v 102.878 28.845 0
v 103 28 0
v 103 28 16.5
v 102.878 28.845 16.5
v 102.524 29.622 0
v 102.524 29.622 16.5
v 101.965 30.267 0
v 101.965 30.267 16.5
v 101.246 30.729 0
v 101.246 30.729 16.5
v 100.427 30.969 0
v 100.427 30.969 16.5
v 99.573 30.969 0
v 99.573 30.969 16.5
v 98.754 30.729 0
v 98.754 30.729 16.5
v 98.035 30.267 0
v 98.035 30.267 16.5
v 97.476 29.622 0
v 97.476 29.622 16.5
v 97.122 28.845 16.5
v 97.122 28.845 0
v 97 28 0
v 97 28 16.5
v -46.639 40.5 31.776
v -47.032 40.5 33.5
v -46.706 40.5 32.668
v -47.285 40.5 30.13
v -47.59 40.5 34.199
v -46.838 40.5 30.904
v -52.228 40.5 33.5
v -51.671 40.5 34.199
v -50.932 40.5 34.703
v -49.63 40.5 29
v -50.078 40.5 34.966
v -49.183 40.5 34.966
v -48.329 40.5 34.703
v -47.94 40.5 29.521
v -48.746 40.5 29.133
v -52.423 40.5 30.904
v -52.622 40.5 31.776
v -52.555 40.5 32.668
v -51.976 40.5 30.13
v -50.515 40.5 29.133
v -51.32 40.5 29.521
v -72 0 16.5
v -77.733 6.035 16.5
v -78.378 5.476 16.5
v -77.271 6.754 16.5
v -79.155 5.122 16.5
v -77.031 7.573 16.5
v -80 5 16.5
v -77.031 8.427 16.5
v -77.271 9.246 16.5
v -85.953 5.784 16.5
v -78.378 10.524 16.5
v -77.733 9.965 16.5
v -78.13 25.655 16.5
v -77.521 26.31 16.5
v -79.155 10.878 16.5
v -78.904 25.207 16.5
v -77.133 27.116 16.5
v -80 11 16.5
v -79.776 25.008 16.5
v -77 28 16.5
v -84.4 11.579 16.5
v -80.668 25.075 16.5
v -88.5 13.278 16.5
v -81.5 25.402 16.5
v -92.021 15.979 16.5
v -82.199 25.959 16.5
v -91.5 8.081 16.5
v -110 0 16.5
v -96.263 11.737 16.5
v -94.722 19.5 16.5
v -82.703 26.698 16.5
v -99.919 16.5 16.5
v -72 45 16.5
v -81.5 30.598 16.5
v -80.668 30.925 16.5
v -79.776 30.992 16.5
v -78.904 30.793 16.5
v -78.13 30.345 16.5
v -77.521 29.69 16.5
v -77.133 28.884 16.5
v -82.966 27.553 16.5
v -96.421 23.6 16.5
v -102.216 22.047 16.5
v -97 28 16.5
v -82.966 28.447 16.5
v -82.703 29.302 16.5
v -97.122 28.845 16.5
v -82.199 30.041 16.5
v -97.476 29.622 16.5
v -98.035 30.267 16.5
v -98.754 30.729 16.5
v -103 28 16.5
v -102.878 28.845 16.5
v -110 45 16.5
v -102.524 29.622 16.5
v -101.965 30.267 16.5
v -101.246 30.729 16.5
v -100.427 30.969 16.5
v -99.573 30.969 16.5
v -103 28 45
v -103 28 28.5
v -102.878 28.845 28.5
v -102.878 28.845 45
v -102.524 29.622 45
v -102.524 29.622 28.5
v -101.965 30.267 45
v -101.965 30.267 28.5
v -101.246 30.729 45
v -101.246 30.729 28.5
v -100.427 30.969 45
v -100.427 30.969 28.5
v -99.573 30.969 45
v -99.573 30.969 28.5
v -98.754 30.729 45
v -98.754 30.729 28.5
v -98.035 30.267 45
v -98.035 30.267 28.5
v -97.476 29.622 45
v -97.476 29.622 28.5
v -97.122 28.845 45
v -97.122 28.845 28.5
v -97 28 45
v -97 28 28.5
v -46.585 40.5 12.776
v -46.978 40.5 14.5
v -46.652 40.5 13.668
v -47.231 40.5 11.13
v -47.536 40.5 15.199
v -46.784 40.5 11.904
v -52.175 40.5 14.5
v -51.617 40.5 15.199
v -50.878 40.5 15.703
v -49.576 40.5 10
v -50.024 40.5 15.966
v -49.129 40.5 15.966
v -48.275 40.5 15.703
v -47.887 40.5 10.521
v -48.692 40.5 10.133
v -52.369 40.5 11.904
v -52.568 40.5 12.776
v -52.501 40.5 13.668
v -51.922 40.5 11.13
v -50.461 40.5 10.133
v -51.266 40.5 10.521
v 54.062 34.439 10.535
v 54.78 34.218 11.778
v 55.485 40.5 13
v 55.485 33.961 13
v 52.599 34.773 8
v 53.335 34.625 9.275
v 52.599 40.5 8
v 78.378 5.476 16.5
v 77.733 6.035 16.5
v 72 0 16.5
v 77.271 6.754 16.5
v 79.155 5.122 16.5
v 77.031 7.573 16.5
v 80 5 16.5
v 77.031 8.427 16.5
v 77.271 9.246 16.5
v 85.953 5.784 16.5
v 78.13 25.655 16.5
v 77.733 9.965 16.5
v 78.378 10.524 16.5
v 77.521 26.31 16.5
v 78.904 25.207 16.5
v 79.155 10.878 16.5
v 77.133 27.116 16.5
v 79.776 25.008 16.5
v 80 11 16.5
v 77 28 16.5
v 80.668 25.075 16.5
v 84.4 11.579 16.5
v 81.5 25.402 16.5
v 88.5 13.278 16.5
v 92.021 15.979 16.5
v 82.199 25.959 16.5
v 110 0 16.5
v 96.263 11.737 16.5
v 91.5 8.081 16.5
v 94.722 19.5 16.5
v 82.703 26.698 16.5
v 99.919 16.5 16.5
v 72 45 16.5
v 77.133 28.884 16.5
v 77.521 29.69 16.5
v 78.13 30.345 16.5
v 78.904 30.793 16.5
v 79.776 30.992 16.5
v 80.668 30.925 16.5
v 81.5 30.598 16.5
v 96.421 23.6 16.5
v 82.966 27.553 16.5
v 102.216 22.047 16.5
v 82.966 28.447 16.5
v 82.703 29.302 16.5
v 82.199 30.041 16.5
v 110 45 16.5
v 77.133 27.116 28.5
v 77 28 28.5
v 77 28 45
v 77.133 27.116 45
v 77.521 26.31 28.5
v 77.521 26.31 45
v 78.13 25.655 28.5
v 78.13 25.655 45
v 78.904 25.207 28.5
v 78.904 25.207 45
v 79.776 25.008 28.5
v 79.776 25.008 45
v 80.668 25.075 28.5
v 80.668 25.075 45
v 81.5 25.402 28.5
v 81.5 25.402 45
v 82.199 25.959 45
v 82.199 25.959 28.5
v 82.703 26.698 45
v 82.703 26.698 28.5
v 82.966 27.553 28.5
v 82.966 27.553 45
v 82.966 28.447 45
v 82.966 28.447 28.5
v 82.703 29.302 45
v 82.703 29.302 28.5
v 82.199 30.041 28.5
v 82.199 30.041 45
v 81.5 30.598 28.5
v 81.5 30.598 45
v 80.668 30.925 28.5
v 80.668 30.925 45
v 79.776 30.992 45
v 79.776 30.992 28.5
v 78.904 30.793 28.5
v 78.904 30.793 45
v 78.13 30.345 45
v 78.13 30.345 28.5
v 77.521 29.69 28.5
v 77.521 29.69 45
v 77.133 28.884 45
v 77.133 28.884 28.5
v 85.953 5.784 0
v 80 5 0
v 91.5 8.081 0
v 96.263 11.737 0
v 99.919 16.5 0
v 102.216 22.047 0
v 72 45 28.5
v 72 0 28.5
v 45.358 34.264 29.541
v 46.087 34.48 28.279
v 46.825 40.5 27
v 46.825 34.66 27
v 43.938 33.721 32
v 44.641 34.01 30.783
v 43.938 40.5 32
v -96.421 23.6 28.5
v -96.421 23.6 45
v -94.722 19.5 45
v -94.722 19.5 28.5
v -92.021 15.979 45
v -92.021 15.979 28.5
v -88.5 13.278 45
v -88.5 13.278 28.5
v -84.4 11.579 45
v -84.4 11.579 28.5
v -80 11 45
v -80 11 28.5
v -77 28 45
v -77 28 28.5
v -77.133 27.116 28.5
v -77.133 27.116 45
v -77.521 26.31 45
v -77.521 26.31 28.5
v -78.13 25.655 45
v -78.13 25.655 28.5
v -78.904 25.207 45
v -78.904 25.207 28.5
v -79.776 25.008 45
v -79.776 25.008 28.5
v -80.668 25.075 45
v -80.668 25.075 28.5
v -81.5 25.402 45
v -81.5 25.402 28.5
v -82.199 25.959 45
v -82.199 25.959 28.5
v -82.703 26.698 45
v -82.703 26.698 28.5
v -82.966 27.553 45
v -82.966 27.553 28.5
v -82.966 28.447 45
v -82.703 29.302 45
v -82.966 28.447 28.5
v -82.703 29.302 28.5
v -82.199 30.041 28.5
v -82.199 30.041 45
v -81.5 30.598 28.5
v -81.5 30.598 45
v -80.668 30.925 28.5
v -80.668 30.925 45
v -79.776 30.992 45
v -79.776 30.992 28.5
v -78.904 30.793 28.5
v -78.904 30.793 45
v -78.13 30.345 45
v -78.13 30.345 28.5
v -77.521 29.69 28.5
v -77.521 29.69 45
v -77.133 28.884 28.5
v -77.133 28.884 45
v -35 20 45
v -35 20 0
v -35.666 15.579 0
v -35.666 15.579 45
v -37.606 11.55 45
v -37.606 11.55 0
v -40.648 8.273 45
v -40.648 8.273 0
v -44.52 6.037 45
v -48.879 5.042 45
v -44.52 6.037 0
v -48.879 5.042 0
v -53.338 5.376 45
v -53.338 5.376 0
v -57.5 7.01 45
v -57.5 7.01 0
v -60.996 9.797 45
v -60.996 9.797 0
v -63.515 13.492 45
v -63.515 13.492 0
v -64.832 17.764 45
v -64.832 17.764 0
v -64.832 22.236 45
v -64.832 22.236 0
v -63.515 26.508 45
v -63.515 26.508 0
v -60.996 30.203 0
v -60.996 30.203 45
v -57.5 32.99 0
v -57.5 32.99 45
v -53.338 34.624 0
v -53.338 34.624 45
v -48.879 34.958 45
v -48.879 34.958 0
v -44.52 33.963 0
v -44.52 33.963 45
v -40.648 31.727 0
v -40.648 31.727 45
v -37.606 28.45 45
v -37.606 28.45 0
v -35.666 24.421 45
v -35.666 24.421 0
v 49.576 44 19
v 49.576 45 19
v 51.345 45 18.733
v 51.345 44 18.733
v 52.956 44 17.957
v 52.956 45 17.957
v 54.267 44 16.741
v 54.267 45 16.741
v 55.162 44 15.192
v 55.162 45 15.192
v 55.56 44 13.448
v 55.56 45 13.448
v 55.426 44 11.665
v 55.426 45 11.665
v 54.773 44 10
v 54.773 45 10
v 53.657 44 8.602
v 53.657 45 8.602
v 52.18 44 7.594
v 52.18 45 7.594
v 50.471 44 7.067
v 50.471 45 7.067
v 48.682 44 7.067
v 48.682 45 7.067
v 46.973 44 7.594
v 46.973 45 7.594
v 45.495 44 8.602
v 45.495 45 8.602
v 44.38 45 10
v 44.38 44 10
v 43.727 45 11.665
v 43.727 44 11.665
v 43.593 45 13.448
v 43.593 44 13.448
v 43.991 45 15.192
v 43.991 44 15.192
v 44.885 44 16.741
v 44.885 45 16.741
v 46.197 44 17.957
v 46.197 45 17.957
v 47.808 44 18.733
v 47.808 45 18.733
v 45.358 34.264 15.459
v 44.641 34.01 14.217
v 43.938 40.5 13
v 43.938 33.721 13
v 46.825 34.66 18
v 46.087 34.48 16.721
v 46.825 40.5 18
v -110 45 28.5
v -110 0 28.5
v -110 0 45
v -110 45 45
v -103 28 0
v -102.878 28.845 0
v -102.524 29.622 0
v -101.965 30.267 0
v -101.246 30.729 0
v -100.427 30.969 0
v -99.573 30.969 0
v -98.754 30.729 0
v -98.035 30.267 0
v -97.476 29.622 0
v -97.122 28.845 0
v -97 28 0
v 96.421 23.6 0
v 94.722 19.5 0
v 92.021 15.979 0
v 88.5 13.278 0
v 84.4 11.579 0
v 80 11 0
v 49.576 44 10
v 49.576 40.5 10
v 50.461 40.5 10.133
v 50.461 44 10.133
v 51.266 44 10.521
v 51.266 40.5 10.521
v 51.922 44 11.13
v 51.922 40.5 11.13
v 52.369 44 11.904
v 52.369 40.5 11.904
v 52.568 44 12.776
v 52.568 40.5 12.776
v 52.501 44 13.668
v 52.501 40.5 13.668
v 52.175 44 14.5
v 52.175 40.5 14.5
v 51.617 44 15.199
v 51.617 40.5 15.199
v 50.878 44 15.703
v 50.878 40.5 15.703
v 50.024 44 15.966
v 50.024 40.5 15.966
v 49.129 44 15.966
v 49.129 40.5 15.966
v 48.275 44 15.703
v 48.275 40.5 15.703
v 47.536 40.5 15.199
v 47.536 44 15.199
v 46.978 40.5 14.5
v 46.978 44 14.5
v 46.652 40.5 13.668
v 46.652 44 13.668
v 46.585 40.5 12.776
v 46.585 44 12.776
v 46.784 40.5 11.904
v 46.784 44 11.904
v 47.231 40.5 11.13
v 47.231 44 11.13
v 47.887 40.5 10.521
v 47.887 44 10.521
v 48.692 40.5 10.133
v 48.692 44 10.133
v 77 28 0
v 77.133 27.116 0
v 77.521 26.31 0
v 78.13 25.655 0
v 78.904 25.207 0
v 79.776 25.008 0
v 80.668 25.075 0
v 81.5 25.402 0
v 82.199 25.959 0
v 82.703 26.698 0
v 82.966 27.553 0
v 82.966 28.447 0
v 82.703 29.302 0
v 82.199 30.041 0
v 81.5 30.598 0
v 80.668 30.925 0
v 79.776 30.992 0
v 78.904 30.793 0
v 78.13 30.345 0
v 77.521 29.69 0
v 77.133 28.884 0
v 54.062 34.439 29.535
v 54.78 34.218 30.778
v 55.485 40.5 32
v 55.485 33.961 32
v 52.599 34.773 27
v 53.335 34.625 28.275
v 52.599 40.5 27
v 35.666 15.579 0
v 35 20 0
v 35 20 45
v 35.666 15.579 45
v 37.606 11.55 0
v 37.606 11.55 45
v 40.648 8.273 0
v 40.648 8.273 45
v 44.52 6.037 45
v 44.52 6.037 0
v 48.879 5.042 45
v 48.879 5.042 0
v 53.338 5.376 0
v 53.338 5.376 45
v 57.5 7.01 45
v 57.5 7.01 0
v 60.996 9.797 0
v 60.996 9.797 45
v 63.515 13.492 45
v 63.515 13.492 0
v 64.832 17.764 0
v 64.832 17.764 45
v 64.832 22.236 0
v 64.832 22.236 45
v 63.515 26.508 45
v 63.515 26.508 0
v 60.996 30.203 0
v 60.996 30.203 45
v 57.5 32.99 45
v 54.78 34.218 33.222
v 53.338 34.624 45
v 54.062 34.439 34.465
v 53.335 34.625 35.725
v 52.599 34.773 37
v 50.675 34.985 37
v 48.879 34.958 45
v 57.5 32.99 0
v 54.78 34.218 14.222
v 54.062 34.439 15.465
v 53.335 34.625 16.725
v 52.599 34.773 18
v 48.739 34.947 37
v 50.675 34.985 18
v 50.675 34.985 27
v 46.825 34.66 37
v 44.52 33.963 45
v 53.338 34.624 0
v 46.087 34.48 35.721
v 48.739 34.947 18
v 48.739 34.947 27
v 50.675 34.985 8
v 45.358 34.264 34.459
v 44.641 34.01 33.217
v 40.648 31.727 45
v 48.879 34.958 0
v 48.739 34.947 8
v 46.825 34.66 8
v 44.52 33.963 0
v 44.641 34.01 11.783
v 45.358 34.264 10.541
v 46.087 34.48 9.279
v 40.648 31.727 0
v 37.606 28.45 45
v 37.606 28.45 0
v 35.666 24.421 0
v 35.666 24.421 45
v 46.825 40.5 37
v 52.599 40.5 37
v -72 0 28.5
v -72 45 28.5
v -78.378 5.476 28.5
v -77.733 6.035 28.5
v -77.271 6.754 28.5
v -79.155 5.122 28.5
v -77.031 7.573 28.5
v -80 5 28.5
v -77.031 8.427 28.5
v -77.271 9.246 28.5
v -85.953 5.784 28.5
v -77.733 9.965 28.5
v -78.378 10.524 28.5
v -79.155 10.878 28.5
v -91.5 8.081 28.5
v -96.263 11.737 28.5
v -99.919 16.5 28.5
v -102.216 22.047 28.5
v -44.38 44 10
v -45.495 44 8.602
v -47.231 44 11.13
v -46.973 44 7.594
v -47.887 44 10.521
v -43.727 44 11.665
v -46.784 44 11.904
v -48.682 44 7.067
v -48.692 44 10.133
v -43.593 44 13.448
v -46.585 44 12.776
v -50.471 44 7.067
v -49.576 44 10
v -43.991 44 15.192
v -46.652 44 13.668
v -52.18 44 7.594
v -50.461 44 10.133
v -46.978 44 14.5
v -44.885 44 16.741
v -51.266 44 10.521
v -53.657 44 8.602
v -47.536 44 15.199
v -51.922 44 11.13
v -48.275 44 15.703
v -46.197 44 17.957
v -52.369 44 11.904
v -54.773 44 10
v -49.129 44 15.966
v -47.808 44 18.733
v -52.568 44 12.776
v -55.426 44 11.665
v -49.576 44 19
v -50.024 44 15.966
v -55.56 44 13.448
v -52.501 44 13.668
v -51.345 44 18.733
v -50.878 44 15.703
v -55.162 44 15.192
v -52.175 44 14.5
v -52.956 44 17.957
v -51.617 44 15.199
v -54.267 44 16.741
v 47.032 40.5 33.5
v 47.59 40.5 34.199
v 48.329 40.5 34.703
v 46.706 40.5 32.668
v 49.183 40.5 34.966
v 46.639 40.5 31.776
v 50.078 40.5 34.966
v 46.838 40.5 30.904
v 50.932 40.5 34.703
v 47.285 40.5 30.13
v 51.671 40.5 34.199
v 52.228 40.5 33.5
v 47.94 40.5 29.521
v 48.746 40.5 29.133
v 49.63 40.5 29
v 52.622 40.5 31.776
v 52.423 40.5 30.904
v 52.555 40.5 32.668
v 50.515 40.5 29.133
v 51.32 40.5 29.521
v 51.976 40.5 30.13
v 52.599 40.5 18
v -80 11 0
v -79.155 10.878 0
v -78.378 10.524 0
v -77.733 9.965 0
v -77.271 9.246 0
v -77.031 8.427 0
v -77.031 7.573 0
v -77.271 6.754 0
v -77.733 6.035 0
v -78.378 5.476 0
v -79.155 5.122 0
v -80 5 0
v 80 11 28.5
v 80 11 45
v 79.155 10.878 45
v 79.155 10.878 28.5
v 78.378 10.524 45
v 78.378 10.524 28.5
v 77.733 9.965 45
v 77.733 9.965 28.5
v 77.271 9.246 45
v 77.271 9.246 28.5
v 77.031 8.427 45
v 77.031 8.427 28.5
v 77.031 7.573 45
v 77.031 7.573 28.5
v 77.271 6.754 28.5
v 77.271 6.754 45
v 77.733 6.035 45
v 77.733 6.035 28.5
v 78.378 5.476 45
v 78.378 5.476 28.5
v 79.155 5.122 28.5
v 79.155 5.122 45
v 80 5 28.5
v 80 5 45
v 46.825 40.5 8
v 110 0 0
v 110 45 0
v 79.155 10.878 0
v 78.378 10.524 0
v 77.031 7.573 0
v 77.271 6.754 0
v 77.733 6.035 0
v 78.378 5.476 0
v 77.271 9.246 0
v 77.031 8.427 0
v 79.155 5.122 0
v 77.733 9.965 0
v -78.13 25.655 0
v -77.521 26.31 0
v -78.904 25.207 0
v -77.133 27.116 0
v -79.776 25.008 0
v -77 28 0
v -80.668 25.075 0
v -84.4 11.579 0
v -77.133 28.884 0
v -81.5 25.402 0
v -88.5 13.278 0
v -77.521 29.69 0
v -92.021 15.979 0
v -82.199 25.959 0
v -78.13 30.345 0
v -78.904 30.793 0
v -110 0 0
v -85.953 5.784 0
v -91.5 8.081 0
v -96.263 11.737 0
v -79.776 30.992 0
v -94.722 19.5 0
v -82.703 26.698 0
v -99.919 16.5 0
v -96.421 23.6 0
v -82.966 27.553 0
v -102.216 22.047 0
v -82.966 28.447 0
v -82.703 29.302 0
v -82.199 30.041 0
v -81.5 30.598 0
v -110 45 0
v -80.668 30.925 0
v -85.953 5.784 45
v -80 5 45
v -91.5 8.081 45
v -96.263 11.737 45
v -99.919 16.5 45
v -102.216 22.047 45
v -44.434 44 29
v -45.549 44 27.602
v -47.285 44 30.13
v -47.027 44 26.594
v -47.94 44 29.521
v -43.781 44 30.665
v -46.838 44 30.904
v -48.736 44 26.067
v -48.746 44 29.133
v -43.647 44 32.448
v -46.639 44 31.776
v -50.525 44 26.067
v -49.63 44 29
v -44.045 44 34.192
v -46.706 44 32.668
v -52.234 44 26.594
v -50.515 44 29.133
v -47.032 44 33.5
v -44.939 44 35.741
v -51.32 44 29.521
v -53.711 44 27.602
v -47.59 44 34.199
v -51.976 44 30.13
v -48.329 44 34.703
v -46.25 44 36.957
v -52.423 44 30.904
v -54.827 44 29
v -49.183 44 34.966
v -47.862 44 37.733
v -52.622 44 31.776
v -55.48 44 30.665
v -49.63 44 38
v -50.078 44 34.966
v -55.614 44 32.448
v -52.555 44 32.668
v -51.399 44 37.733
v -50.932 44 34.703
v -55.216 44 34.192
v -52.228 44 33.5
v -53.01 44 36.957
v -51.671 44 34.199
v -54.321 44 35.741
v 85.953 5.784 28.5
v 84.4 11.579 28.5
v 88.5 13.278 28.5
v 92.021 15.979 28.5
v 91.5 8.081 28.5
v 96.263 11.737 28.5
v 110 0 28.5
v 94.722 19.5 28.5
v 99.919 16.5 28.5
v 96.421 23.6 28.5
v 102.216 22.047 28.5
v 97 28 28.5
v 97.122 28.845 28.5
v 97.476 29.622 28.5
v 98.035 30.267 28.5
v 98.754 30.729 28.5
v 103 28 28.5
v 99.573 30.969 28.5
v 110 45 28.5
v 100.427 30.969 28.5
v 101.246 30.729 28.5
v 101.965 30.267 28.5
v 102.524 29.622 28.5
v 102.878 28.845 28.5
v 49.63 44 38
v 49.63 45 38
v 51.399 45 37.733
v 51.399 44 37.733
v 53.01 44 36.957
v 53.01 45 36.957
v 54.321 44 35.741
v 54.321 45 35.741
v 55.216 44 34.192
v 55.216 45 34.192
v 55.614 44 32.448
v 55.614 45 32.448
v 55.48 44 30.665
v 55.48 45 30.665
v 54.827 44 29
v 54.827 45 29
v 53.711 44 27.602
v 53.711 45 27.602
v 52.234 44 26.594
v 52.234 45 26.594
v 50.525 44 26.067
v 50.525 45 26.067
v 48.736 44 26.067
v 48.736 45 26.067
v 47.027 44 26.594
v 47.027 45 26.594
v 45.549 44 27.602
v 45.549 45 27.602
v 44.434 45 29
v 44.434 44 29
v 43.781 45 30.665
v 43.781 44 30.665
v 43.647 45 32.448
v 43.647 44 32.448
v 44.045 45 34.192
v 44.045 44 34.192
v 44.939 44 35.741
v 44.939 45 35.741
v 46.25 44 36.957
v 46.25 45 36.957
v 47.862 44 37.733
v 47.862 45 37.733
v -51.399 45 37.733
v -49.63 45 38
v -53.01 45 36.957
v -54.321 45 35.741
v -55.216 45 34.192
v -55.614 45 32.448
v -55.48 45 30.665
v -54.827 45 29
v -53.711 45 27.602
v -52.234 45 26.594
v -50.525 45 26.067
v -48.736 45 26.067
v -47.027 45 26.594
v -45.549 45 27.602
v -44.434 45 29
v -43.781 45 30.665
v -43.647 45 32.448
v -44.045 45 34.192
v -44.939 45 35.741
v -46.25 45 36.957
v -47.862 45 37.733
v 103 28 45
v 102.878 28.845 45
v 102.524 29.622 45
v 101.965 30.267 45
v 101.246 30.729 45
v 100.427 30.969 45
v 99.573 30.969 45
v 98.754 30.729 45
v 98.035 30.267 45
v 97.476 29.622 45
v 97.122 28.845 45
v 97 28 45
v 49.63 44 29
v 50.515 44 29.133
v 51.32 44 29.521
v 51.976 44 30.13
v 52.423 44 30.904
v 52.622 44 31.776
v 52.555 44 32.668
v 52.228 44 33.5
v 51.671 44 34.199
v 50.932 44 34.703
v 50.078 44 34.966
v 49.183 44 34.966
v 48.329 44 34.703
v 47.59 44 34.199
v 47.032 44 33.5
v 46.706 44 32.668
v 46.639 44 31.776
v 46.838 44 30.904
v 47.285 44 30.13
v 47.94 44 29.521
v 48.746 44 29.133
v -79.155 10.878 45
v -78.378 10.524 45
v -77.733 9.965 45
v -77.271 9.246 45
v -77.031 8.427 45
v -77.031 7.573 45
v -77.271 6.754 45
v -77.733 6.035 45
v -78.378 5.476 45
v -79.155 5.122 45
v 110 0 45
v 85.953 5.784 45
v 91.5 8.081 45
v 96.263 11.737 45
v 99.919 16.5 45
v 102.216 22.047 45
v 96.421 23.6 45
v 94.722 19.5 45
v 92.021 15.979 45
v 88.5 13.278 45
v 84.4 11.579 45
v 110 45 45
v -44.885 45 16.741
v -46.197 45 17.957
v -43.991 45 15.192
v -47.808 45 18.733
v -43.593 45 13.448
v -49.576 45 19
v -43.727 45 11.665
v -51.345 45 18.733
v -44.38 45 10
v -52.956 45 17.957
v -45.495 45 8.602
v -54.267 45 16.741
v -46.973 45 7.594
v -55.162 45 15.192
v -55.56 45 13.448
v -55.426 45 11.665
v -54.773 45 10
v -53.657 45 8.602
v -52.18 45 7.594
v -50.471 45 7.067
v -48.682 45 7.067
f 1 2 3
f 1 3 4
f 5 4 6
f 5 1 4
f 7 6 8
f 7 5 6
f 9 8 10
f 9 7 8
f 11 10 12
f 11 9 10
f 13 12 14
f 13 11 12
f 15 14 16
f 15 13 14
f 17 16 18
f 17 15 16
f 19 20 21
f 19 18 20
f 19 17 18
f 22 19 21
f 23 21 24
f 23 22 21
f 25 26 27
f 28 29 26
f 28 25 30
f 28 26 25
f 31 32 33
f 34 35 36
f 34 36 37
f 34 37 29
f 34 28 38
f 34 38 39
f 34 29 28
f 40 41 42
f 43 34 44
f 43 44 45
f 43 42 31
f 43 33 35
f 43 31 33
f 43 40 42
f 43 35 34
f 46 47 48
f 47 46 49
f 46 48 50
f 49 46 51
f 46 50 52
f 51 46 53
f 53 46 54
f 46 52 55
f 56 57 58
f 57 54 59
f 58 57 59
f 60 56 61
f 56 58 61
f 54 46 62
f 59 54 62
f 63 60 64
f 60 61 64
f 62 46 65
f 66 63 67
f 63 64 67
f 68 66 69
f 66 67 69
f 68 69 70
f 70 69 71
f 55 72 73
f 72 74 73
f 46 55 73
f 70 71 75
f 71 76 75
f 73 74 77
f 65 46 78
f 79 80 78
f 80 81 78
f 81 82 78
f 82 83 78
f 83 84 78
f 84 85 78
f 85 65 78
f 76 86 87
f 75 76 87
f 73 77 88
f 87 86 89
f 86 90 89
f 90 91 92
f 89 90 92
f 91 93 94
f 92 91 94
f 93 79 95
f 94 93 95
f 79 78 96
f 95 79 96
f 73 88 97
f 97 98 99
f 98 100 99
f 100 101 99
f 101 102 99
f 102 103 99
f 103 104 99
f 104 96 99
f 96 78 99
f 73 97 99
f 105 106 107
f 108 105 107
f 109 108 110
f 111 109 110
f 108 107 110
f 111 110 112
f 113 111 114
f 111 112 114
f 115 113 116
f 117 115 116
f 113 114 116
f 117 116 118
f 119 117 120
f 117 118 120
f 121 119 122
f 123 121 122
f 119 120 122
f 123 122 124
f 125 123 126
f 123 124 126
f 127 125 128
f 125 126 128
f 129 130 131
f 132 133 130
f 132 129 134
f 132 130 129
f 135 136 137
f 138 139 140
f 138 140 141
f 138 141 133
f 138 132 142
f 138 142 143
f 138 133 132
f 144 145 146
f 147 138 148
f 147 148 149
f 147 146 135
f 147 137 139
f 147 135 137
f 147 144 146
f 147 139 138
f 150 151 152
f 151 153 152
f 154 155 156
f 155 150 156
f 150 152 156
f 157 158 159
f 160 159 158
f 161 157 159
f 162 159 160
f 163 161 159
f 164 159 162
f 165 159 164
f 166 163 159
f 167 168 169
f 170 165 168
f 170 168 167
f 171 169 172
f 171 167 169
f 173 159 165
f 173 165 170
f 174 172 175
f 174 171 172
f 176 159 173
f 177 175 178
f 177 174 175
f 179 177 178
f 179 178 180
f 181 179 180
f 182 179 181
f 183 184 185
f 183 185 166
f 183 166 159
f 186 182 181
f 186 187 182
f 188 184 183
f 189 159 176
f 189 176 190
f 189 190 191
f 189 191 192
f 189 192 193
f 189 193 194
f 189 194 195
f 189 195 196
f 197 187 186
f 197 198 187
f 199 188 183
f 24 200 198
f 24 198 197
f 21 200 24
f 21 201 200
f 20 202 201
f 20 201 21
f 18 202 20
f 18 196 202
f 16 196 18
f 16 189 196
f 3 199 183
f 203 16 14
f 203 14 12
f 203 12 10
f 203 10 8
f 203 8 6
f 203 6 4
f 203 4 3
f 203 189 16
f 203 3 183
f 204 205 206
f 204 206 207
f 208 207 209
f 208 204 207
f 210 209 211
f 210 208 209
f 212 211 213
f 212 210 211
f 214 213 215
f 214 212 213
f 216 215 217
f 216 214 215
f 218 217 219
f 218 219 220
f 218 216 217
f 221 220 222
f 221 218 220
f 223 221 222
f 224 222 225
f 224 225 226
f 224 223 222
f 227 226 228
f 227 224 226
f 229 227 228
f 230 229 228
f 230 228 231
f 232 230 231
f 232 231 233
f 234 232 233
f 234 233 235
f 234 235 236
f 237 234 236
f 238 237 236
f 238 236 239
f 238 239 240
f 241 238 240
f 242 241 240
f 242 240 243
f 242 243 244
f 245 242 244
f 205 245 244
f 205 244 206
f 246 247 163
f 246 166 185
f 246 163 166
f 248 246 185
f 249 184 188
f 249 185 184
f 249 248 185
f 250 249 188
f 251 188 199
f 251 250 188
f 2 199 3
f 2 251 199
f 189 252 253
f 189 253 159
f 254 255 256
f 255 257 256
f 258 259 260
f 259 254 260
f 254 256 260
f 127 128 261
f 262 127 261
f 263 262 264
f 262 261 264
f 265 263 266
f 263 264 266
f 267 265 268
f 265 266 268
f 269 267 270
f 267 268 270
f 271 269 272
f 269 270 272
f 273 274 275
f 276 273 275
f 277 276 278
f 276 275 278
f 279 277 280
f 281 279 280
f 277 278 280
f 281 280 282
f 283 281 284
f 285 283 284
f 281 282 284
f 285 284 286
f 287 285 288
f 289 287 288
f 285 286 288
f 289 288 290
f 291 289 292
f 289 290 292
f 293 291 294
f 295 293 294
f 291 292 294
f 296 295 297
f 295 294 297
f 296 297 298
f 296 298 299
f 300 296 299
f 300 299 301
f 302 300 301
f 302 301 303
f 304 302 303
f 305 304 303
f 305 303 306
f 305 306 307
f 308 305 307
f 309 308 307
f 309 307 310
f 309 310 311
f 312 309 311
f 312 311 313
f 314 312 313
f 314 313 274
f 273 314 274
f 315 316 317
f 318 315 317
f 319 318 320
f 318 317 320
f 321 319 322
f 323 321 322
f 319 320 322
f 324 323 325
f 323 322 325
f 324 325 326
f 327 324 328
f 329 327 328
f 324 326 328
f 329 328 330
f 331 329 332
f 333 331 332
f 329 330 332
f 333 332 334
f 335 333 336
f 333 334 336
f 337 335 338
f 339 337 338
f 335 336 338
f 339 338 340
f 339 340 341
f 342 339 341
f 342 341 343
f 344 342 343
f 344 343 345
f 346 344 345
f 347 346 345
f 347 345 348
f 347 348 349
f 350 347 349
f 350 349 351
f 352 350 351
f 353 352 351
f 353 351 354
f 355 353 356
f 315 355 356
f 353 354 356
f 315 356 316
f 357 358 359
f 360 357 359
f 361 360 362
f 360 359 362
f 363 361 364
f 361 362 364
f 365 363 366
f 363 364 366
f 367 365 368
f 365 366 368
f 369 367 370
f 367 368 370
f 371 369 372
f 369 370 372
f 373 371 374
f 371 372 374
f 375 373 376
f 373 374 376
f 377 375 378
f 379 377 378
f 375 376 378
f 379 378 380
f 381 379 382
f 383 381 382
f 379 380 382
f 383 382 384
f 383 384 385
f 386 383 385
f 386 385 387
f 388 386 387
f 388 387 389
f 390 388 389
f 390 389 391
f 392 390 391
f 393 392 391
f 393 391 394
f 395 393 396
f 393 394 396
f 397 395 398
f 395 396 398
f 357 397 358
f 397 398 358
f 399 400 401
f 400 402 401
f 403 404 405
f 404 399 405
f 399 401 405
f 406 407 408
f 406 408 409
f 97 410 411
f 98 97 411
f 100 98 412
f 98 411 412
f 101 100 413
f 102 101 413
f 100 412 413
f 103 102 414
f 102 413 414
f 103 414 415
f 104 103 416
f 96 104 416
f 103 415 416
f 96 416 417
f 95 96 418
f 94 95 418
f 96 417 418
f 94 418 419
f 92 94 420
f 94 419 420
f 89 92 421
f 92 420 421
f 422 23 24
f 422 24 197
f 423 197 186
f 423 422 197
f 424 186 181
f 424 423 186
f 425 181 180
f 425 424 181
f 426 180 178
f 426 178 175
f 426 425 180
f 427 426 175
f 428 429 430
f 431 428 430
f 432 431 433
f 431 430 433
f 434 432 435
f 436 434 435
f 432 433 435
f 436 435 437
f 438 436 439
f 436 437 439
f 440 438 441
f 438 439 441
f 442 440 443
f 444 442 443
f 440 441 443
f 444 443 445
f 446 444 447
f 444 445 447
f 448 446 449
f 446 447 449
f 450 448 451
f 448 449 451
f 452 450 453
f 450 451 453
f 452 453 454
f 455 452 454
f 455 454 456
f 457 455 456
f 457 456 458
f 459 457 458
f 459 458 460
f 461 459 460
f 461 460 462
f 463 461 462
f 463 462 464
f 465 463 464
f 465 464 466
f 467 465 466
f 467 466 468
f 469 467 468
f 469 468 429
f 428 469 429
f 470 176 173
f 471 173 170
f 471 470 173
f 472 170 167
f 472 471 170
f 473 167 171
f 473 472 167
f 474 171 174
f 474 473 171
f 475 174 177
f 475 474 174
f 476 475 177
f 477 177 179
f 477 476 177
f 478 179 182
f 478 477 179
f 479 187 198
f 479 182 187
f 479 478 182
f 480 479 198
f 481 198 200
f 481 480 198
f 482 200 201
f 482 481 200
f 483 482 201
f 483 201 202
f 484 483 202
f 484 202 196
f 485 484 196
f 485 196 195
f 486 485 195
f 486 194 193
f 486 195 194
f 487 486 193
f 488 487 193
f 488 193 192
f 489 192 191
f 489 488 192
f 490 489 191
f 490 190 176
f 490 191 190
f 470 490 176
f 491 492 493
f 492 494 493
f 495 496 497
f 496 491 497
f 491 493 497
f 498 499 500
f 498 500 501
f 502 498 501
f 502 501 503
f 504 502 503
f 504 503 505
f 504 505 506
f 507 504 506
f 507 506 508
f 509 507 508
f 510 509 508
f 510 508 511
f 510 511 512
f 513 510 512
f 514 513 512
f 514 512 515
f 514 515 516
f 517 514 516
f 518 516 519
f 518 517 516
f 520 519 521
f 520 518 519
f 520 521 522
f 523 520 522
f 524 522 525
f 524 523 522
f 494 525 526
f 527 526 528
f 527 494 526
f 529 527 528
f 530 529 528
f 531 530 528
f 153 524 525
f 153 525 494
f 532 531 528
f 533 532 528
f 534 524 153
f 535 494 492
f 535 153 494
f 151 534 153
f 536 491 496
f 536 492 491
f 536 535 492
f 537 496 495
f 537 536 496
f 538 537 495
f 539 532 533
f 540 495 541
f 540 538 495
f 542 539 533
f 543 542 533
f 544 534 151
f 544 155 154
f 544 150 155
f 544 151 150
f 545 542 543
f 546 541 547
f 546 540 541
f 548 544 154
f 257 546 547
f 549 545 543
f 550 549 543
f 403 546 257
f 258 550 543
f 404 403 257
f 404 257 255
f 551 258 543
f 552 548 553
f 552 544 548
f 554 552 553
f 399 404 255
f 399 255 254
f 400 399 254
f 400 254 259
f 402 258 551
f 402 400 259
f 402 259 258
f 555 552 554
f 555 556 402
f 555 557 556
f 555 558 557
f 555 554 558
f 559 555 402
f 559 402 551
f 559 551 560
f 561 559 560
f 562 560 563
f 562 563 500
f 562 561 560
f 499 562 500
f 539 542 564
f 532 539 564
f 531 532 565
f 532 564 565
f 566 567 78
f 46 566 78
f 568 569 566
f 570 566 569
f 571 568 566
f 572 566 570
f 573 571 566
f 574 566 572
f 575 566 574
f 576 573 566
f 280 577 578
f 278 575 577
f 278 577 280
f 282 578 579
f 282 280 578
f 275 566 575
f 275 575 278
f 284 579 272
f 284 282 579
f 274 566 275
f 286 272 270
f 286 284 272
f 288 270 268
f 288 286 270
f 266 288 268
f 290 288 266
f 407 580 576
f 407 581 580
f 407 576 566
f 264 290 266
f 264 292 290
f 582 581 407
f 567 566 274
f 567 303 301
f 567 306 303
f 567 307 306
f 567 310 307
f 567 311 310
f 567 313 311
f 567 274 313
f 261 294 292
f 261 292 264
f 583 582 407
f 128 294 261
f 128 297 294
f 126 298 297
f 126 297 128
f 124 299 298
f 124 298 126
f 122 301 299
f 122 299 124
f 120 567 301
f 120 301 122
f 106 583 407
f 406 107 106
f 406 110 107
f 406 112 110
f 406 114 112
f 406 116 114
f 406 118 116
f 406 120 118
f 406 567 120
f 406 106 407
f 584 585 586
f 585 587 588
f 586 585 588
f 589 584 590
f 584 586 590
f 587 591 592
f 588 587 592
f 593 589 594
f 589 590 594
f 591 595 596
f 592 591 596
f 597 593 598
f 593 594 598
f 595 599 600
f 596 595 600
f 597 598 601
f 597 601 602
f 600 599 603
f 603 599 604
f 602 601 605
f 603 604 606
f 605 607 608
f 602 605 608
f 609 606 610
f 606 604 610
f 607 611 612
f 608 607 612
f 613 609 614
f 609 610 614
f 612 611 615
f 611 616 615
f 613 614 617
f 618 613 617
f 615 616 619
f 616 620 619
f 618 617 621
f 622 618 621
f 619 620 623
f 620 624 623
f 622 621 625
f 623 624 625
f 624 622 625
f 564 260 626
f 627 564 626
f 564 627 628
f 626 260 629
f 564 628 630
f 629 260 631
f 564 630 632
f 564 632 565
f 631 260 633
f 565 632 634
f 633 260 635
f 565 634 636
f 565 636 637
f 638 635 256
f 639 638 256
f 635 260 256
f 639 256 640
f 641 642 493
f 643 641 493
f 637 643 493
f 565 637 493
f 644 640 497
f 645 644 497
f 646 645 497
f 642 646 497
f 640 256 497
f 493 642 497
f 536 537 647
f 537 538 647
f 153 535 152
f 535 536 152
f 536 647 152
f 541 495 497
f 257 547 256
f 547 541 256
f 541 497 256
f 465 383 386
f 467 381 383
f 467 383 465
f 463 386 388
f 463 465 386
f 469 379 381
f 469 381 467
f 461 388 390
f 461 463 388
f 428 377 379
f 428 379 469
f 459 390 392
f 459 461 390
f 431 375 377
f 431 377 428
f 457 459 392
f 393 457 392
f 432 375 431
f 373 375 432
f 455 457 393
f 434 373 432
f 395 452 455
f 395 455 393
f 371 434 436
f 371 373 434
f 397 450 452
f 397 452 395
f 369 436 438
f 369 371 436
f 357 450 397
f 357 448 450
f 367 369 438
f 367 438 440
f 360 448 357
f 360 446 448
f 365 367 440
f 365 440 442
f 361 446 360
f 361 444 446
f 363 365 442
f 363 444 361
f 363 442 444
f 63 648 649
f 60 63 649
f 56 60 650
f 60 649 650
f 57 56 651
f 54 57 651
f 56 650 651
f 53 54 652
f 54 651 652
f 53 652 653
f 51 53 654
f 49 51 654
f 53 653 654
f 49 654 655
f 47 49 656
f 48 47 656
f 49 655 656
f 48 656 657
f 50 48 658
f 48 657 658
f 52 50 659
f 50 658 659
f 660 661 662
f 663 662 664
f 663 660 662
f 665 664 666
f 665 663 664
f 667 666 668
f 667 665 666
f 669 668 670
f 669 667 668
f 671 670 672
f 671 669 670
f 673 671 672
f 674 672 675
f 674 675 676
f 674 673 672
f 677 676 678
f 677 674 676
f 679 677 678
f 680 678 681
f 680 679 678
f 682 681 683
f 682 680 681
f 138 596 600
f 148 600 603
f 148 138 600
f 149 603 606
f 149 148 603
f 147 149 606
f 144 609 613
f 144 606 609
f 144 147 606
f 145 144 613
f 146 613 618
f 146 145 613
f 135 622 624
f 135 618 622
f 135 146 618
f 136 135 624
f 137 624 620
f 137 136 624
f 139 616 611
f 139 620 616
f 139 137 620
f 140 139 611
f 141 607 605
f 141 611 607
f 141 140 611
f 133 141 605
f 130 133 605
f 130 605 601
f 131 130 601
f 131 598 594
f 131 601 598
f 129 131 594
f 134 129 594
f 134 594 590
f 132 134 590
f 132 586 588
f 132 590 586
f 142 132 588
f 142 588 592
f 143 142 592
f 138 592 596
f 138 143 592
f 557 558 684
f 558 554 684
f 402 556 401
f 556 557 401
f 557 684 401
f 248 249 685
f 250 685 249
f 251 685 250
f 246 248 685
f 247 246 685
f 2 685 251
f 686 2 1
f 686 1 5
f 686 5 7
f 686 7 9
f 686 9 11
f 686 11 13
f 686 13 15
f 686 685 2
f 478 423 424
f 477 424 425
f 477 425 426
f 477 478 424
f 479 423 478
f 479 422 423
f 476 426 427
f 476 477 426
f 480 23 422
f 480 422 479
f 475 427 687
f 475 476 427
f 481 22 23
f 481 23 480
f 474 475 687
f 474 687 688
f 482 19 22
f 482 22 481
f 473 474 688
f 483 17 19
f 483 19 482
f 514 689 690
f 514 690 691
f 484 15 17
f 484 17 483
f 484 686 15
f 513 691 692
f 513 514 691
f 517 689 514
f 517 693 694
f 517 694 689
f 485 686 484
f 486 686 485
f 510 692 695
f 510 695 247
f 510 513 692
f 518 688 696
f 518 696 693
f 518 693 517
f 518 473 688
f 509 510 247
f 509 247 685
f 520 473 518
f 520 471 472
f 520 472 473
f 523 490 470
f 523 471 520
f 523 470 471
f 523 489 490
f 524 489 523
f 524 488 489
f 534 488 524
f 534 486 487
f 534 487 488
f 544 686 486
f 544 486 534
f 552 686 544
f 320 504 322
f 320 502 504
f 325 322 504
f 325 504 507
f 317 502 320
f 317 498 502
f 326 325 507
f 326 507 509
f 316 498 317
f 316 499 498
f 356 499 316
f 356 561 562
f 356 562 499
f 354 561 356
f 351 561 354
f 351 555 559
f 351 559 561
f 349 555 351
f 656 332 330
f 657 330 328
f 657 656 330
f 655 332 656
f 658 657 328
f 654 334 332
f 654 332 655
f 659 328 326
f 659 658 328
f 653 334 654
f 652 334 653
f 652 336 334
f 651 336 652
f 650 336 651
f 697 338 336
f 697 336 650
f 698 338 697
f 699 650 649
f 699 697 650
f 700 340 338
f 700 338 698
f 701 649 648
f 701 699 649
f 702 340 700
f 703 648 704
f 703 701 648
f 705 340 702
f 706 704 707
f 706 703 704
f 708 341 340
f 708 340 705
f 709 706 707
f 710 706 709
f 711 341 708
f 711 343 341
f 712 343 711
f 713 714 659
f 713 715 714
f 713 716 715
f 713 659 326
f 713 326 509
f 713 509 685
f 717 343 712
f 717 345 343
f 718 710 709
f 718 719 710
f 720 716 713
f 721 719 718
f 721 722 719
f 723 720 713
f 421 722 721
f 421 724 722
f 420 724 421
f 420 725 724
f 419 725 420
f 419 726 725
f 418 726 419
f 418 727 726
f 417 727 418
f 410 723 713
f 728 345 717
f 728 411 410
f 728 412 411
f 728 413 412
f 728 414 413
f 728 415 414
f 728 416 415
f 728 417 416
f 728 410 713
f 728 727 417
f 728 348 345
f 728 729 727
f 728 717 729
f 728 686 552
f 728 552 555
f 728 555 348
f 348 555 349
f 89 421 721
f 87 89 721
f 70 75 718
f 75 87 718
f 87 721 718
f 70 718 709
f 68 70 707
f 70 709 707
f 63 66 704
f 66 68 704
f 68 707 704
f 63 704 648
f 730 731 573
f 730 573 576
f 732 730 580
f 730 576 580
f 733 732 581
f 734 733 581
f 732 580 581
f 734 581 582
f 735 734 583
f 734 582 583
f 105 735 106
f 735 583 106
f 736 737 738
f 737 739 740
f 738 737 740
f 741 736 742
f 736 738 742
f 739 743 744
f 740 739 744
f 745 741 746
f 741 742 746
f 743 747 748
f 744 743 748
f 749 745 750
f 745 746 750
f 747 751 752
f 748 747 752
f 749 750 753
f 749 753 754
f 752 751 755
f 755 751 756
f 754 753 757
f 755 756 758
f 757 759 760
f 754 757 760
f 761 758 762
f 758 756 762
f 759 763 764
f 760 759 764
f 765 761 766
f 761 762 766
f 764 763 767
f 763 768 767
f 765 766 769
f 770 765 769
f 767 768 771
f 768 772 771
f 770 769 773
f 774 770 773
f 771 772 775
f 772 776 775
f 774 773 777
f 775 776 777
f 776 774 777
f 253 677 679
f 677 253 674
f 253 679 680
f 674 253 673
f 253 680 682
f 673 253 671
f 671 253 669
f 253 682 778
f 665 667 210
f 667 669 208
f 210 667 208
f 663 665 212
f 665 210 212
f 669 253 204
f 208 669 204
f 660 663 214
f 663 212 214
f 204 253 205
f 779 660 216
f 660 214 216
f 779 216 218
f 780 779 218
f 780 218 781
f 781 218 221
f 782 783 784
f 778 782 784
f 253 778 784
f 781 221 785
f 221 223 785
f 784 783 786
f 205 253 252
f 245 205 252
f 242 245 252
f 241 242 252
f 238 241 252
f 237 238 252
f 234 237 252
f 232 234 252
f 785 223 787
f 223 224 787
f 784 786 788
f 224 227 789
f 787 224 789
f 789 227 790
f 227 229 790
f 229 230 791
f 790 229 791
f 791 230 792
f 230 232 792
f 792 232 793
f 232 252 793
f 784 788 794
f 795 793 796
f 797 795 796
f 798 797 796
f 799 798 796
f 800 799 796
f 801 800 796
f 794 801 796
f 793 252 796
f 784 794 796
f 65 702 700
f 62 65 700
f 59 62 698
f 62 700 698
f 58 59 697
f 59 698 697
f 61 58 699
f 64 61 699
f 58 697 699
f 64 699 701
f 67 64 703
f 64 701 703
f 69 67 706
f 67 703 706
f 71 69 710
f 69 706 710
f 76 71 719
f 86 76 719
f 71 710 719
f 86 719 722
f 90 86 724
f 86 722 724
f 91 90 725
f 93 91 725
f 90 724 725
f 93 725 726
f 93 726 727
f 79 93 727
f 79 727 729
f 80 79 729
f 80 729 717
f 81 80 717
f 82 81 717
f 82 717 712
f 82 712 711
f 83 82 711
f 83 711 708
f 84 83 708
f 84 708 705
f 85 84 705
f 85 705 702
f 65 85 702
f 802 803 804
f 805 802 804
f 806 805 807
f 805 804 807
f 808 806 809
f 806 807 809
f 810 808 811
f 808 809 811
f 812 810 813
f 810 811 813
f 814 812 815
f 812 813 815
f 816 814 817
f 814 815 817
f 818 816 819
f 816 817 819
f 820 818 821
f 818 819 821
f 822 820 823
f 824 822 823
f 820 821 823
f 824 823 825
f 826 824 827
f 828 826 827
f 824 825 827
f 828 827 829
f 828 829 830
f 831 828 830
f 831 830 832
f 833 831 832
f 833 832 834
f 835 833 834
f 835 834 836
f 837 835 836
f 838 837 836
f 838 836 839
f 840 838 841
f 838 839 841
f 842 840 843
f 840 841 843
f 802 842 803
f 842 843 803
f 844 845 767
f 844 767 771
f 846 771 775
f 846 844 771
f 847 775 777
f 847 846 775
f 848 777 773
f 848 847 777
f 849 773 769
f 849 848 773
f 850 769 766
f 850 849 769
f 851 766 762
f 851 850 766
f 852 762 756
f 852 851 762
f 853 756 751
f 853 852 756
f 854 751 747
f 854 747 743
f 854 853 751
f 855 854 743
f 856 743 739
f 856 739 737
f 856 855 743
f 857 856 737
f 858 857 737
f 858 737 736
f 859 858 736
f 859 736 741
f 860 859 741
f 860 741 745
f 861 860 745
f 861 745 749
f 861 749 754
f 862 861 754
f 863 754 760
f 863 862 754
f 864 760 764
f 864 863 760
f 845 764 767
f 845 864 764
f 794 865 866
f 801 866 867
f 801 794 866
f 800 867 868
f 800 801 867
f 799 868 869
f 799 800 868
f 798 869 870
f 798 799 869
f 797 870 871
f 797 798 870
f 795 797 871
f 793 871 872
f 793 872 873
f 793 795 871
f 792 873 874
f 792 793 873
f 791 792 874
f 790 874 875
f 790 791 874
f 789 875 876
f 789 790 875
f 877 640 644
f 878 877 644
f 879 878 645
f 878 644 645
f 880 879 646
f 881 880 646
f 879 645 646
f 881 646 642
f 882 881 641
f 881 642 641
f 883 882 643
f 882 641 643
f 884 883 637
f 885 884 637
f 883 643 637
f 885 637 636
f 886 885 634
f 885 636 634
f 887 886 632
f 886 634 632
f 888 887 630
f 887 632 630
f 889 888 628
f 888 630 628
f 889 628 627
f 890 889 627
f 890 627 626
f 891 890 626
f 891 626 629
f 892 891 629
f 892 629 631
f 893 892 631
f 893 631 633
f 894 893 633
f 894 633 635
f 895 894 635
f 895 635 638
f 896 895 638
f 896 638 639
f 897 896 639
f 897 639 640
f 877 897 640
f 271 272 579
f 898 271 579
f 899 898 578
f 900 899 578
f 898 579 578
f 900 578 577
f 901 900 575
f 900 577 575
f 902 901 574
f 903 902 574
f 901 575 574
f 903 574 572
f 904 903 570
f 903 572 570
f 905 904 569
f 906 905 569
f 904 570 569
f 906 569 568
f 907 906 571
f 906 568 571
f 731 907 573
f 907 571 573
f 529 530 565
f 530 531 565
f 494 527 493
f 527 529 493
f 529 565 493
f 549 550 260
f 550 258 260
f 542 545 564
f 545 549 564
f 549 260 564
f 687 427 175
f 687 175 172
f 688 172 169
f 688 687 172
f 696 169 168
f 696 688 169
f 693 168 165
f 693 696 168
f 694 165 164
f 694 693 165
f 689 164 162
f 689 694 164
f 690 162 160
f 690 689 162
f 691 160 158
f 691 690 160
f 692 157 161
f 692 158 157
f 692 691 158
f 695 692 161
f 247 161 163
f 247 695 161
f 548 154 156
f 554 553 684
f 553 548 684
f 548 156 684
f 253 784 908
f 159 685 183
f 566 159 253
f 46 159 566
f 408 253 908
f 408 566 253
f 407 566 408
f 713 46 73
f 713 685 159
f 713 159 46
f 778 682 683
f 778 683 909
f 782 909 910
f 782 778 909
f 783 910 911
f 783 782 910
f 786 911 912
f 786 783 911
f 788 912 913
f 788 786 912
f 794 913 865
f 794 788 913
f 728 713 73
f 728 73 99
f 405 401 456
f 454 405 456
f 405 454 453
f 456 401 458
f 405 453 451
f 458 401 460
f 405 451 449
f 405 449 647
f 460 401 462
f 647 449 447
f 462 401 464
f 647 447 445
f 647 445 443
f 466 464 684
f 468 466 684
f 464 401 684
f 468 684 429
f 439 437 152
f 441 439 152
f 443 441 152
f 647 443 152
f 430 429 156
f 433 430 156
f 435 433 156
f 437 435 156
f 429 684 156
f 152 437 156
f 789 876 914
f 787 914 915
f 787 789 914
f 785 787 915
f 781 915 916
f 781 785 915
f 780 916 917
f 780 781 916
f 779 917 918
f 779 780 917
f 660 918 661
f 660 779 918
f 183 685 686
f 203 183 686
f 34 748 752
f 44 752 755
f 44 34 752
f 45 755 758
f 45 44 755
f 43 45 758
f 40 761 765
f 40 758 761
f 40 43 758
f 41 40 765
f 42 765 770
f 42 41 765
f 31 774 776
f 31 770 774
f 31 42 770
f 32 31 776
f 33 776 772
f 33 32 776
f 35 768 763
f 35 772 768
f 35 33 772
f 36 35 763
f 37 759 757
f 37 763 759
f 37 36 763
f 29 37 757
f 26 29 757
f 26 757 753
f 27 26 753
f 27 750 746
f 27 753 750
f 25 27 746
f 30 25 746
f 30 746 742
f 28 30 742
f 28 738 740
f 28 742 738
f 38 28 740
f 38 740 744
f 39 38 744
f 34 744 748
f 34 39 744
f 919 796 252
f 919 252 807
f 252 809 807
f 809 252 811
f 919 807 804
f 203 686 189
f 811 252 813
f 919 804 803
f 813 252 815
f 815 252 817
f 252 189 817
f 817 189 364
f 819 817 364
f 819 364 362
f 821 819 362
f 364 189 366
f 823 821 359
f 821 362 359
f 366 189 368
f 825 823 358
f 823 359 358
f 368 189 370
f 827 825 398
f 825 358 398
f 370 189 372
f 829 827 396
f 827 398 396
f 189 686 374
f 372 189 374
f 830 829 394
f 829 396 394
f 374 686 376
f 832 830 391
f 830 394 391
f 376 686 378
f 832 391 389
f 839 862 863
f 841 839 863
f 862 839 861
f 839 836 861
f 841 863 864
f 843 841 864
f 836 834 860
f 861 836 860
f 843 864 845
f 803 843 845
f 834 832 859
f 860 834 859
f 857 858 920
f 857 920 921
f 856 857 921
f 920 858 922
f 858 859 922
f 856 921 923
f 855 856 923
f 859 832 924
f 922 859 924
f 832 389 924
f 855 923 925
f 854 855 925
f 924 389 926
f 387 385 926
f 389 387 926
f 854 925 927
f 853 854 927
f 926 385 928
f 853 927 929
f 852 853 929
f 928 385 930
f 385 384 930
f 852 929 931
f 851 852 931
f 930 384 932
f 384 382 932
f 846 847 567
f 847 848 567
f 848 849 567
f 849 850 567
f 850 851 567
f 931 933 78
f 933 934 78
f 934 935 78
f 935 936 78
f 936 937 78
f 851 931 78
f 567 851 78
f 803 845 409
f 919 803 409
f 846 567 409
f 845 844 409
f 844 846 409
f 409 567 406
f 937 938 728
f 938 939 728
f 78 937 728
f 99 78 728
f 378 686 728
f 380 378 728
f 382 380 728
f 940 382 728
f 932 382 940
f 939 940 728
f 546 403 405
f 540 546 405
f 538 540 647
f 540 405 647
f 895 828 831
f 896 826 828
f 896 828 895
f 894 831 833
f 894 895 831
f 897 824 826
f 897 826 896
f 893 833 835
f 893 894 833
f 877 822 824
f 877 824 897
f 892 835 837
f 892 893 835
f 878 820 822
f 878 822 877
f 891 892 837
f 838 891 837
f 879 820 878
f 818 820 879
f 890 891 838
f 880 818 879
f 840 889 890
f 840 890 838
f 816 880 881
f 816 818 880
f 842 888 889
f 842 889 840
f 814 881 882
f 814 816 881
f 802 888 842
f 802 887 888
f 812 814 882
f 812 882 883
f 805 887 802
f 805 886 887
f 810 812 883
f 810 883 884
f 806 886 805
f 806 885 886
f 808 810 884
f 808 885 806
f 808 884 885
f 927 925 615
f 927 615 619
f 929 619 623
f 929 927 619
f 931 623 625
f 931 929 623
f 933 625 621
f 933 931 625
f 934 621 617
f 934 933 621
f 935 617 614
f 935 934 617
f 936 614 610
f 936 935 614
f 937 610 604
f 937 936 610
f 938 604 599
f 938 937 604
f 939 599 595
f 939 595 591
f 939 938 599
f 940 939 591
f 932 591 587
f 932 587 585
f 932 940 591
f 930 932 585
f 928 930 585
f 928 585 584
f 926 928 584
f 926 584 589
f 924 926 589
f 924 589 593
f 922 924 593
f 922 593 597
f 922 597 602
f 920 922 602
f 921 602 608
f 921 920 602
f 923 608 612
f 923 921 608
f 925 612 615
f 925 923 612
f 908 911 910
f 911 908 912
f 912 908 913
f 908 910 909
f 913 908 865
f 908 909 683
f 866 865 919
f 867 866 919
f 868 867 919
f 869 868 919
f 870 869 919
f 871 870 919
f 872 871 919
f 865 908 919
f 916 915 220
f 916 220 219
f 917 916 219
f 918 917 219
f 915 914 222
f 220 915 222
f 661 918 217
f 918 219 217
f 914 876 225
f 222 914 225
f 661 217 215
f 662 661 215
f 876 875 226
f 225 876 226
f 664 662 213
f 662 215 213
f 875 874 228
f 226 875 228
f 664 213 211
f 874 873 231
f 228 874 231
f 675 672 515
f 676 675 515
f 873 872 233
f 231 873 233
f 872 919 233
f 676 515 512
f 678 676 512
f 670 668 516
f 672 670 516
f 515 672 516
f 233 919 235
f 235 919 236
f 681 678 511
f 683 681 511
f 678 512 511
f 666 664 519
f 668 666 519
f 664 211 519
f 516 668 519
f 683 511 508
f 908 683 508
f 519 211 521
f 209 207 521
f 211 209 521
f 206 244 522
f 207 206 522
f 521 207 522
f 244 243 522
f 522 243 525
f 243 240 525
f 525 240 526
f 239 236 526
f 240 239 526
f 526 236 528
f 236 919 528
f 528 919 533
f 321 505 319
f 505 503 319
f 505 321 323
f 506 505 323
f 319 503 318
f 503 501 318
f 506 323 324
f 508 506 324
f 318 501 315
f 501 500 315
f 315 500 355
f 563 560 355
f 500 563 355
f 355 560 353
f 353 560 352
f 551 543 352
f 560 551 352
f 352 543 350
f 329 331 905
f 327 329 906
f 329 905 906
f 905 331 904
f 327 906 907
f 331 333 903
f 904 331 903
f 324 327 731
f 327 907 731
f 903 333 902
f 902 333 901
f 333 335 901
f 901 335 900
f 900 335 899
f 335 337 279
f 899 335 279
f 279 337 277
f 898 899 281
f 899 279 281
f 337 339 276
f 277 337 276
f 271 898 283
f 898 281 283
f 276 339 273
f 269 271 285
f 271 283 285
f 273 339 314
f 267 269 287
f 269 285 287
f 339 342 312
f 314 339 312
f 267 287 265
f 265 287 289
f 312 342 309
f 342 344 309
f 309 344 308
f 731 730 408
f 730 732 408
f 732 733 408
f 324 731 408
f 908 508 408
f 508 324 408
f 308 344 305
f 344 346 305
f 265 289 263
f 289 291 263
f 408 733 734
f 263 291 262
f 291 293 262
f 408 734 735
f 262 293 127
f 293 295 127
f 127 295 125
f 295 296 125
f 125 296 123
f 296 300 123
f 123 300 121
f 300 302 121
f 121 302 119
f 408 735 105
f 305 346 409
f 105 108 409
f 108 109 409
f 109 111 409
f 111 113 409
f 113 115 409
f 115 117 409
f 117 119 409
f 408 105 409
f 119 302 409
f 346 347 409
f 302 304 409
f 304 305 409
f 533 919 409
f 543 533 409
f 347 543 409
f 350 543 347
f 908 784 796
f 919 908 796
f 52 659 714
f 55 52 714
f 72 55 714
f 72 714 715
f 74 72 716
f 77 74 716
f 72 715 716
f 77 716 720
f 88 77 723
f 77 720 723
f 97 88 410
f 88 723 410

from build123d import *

# Parameters (mm, degrees)
SKETCH1_W               = 110
SKETCH1_H               = 45
SKETCH1_R               = 15
SKETCH1_R_2             = 3
BOSS_EXTRUDE1_DEPTH     = 45
CUT_EXTRUDE4_REACH      = 129.083
CUT_EXTRUDE4_END_RADIUS = 15
BOSS_EXTRUDE2_DEPTH     = 4.5
BOSS_EXTRUDE3_DEPTH     = 4.5
SKETCH12_R              = 3
CUT_EXTRUDE5_DEPTH      = 4.5
SKETCH15_R              = 3
CUT_EXTRUDE6_DEPTH      = 4.5
SKETCH16_R              = 6
CUT_EXTRUDE7_DEPTH      = 1
SKETCH18_W              = 38
SKETCH18_H              = 12
CUT_EXTRUDE8_DEPTH      = 128.082650271


with BuildPart() as part:
    # Sketch1 → Boss-Extrude1 (new body)
    with BuildSketch(Plane.XY):
        with Locations((55, 22.5)):
            Rectangle(SKETCH1_W, SKETCH1_H)
        with Locations(Location((50, 20, 0), (0, 0, 180))):
            Circle(SKETCH1_R, mode=Mode.SUBTRACT)
        with Locations(Location((80, 28, 0), (0, 0, 180))):
            Circle(SKETCH1_R_2, mode=Mode.SUBTRACT)
        with BuildLine():
            ThreePointArc((80, 5), (96.263455967, 11.736544033), (103, 28))
            ThreePointArc((103, 28), (100, 31), (97, 28))
            ThreePointArc((97, 28), (92.02081528, 15.97918472), (80, 11))
            ThreePointArc((80, 11), (77, 8), (80, 5))
        make_face(mode=Mode.SUBTRACT)
    boss_extrude1 = extrude(amount=BOSS_EXTRUDE1_DEPTH)

    # Cut-Extrude4: up to this cylinder (the profile starts outside it)
    cut_extrude4_end = Plane(origin=(50, 20, 22.5), z_dir=(0, 0, -1)) * Cylinder(CUT_EXTRUDE4_END_RADIUS, 308.166, mode=Mode.PRIVATE)
    # Sketch3 → Cut-Extrude4 (cut, up to the surface)
    with BuildSketch(Plane(origin=(0, 45, 0), x_dir=(1, 0, 0), z_dir=(0, 1, 0)), mode=Mode.PRIVATE) as cut_extrude4_sk1:
        Polygon((55.485397506, -32), (52.59864616, -27), (46.825143468, -27), (43.938392122, -32), (46.825143468, -37), (52.59864616, -37), align=None)
    cut_extrude4_tool1 = extrude(cut_extrude4_sk1.sketch, amount=-CUT_EXTRUDE4_REACH, mode=Mode.PRIVATE) - cut_extrude4_end
    add(cut_extrude4_tool1.solids().sort_by_distance((49.711895, 45, 32))[0], mode=Mode.SUBTRACT)
    # Sketch3 → Cut-Extrude4 (cut, up to the surface)
    with BuildSketch(Plane(origin=(0, 45, 0), x_dir=(1, 0, 0), z_dir=(0, 1, 0)), mode=Mode.PRIVATE) as cut_extrude4_sk2:
        Polygon((55.485397506, -13), (52.59864616, -8), (46.825143468, -8), (43.938392122, -13), (46.825143468, -18), (52.59864616, -18), align=None)
    cut_extrude4_tool2 = extrude(cut_extrude4_sk2.sketch, amount=-CUT_EXTRUDE4_REACH, mode=Mode.PRIVATE) - cut_extrude4_end
    add(cut_extrude4_tool2.solids().sort_by_distance((49.711895, 45, 13))[0], mode=Mode.SUBTRACT)

    # Sketch9 → Boss-Extrude2 (add)
    with BuildSketch(Plane(origin=(0, 45, 0), x_dir=(1, 0, 0), z_dir=(0, 1, 0))):
        Polygon((46.825143468, -8), (43.938392122, -13), (46.825143468, -18), (52.59864616, -18), (55.485397506, -13), (52.59864616, -8), align=None)
    extrude(amount=-BOSS_EXTRUDE2_DEPTH)

    # Sketch10 → Boss-Extrude3 (add)
    with BuildSketch(Plane(origin=(0, 45, 0), x_dir=(1, 0, 0), z_dir=(0, 1, 0))):
        Polygon((43.938392122, -32), (46.825143468, -37), (52.59864616, -37), (55.485397506, -32), (52.59864616, -27), (46.825143468, -27), align=None)
    extrude(amount=-BOSS_EXTRUDE3_DEPTH)

    # Sketch12 → Cut-Extrude5 (cut)
    with BuildSketch(Plane.XZ.offset(-40.5)):
        with Locations(Location((49.576462362, 13, 0), (0, 0, 270))):
            Circle(SKETCH12_R)
    cut_extrude5 = extrude(amount=-CUT_EXTRUDE5_DEPTH, mode=Mode.SUBTRACT)

    # Sketch15 → Cut-Extrude6 (cut)
    with BuildSketch(Plane.XZ.offset(-40.5)):
        with Locations(Location((49.63041025, 32, 0), (0, 0, 270))):
            Circle(SKETCH15_R)
    cut_extrude6 = extrude(amount=-CUT_EXTRUDE6_DEPTH, mode=Mode.SUBTRACT)

    # Sketch16 → Cut-Extrude7 (cut)
    with BuildSketch(Plane(origin=(0, 45, 0), x_dir=(1, 0, 0), z_dir=(0, 1, 0))):
        with Locations(Location((49.63041025, -32, 0), (0, 0, 270))):
            Circle(SKETCH16_R)
        with Locations(Location((49.576462362, -13, 0), (0, 0, 270))):
            Circle(SKETCH16_R)
    cut_extrude7 = extrude(amount=-CUT_EXTRUDE7_DEPTH, mode=Mode.SUBTRACT)

    # Sketch18 → Cut-Extrude8 (cut, through all)
    with BuildSketch(Plane(origin=(0, 45, 0), x_dir=(1, 0, 0), z_dir=(0, 1, 0))):
        with Locations((91, -22.5)):
            Rectangle(SKETCH18_W, SKETCH18_H)
    cut_extrude8 = extrude(amount=-CUT_EXTRUDE8_DEPTH, mode=Mode.SUBTRACT)

    # Mirror1: Boss-Extrude1, Cut-Extrude5, Cut-Extrude6, Cut-Extrude7, Cut-Extrude8 across plane
    add(boss_extrude1.mirror(Plane(origin=(0, 0, 45), x_dir=(0, 0, 1), z_dir=(-1, 0, 0))))
    add(cut_extrude5.mirror(Plane(origin=(0, 0, 45), x_dir=(0, 0, 1), z_dir=(-1, 0, 0))), mode=Mode.SUBTRACT)
    add(cut_extrude6.mirror(Plane(origin=(0, 0, 45), x_dir=(0, 0, 1), z_dir=(-1, 0, 0))), mode=Mode.SUBTRACT)
    add(cut_extrude7.mirror(Plane(origin=(0, 0, 45), x_dir=(0, 0, 1), z_dir=(-1, 0, 0))), mode=Mode.SUBTRACT)
    add(cut_extrude8.mirror(Plane(origin=(0, 0, 45), x_dir=(0, 0, 1), z_dir=(-1, 0, 0))), mode=Mode.SUBTRACT)


solid = part.part
